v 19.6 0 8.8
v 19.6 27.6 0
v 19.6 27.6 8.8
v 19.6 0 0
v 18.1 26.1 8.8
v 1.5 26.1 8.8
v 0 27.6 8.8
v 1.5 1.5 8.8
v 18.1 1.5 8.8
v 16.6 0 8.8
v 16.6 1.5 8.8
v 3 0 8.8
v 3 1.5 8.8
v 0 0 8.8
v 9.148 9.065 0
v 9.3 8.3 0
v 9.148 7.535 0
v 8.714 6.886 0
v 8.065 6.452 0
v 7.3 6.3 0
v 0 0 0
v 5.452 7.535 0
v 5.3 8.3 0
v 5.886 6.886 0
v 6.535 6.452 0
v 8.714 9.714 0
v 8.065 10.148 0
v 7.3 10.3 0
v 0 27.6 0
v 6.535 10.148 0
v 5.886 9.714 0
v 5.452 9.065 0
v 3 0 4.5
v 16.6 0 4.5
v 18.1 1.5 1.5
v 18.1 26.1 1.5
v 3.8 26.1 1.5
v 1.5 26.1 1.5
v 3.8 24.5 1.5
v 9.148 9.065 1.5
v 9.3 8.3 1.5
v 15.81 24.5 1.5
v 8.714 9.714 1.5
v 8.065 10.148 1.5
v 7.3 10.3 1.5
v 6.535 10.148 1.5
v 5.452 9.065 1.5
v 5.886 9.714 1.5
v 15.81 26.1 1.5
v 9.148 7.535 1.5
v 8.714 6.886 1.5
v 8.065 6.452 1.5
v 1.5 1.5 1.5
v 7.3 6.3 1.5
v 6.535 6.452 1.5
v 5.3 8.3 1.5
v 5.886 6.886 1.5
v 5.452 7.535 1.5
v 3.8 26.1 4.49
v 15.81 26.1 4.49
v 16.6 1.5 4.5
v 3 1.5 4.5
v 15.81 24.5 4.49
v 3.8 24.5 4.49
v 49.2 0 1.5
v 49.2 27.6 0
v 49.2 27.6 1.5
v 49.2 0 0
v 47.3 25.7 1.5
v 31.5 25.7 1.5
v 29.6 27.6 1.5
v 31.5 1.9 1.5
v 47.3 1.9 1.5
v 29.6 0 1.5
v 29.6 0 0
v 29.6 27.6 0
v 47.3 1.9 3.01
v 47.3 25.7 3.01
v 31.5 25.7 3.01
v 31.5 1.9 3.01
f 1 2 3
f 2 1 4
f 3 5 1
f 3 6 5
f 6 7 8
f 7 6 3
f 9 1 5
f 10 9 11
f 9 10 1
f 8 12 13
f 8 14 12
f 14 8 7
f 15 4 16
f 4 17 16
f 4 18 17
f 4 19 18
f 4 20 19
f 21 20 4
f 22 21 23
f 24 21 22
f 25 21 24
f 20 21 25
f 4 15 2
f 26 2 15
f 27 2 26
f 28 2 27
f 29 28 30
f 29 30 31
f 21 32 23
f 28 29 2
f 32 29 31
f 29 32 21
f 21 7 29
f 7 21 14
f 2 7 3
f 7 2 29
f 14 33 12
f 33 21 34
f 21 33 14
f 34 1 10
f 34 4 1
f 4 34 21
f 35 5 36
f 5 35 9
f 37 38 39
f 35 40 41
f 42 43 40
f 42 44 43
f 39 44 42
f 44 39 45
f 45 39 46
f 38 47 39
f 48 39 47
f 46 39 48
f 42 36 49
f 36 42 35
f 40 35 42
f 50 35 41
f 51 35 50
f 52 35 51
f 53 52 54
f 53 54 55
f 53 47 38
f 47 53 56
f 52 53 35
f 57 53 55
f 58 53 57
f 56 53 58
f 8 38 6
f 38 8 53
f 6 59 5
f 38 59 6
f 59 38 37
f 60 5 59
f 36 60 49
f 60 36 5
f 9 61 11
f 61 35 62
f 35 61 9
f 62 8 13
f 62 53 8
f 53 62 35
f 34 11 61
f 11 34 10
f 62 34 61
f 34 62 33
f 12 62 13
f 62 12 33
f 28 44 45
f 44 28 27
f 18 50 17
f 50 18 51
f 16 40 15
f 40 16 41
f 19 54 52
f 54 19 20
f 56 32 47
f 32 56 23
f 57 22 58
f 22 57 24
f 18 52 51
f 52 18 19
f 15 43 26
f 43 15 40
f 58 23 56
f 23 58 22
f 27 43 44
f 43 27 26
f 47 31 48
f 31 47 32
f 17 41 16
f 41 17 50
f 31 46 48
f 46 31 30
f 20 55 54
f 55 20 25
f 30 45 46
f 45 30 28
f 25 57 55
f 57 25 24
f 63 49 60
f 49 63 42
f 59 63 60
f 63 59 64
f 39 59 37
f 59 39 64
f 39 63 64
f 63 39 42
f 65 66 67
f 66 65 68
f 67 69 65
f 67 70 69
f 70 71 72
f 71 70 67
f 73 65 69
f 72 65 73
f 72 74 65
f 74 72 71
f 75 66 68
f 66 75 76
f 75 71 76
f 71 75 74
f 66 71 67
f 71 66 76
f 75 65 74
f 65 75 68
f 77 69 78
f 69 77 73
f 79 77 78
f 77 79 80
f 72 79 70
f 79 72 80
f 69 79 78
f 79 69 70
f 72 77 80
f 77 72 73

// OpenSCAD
// Copyright (c) 2015 Elena Grandi See the file LICENSE for copying permission.

BOARD_LENGTH = 23;
BOARD_WIDTH = 15;
BOARD_HEIGHT = 2;
COMP_HEIGHT = 3;
// Uncomment the first value if you want to have something soldered to the 
// pins, the second if you just want the espruino pico.
//PIN_HEIGHT = 9;
PIN_HEIGHT = 0.8;
WALL = 1.5;
CLEAR = 0.8;
USB_WIDTH = 12;
B_X = 5;
B_Y = 6;
B_R = 2;

// box
union() {
    difference() {
        cube([BOARD_WIDTH + WALL * 2 + CLEAR * 2,
            BOARD_LENGTH + WALL * 2 + CLEAR * 2,
            BOARD_HEIGHT + COMP_HEIGHT + PIN_HEIGHT + WALL * 2 ]);
        translate([WALL, WALL, WALL]) cube([BOARD_WIDTH + CLEAR * 2,
            BOARD_LENGTH +CLEAR * 2,
            BOARD_HEIGHT + COMP_HEIGHT + PIN_HEIGHT + WALL * 2]); 
        translate([WALL + (BOARD_WIDTH - USB_WIDTH) / 2, -1,
            COMP_HEIGHT + WALL]) 
            cube([USB_WIDTH + CLEAR * 2, WALL + 2, 
                BOARD_HEIGHT + PIN_HEIGHT + WALL + 1]);
        translate([B_X + WALL + CLEAR, B_Y + WALL + CLEAR, -1]) 
            cylinder(r=B_R, h=WALL + 2, $fn=16);
    }
    translate([WALL + (BOARD_WIDTH - USB_WIDTH) / 2 + CLEAR, 
        BOARD_LENGTH + WALL,
        WALL - 0.01])
            cube([USB_WIDTH + 0.01, CLEAR*3 + 0.01, COMP_HEIGHT]);
}

// lid
translate([BOARD_WIDTH + WALL * 2 + CLEAR * 2 + 10, 0, 0]) union() {
    cube([BOARD_WIDTH + WALL * 2 + CLEAR * 2,
        BOARD_LENGTH + WALL * 2 + CLEAR * 2,
        WALL]);
    translate([WALL + CLEAR/2, WALL + CLEAR/2, 0.01]) 
        cube([BOARD_WIDTH + CLEAR, BOARD_LENGTH + CLEAR, WALL * 2]);
}
